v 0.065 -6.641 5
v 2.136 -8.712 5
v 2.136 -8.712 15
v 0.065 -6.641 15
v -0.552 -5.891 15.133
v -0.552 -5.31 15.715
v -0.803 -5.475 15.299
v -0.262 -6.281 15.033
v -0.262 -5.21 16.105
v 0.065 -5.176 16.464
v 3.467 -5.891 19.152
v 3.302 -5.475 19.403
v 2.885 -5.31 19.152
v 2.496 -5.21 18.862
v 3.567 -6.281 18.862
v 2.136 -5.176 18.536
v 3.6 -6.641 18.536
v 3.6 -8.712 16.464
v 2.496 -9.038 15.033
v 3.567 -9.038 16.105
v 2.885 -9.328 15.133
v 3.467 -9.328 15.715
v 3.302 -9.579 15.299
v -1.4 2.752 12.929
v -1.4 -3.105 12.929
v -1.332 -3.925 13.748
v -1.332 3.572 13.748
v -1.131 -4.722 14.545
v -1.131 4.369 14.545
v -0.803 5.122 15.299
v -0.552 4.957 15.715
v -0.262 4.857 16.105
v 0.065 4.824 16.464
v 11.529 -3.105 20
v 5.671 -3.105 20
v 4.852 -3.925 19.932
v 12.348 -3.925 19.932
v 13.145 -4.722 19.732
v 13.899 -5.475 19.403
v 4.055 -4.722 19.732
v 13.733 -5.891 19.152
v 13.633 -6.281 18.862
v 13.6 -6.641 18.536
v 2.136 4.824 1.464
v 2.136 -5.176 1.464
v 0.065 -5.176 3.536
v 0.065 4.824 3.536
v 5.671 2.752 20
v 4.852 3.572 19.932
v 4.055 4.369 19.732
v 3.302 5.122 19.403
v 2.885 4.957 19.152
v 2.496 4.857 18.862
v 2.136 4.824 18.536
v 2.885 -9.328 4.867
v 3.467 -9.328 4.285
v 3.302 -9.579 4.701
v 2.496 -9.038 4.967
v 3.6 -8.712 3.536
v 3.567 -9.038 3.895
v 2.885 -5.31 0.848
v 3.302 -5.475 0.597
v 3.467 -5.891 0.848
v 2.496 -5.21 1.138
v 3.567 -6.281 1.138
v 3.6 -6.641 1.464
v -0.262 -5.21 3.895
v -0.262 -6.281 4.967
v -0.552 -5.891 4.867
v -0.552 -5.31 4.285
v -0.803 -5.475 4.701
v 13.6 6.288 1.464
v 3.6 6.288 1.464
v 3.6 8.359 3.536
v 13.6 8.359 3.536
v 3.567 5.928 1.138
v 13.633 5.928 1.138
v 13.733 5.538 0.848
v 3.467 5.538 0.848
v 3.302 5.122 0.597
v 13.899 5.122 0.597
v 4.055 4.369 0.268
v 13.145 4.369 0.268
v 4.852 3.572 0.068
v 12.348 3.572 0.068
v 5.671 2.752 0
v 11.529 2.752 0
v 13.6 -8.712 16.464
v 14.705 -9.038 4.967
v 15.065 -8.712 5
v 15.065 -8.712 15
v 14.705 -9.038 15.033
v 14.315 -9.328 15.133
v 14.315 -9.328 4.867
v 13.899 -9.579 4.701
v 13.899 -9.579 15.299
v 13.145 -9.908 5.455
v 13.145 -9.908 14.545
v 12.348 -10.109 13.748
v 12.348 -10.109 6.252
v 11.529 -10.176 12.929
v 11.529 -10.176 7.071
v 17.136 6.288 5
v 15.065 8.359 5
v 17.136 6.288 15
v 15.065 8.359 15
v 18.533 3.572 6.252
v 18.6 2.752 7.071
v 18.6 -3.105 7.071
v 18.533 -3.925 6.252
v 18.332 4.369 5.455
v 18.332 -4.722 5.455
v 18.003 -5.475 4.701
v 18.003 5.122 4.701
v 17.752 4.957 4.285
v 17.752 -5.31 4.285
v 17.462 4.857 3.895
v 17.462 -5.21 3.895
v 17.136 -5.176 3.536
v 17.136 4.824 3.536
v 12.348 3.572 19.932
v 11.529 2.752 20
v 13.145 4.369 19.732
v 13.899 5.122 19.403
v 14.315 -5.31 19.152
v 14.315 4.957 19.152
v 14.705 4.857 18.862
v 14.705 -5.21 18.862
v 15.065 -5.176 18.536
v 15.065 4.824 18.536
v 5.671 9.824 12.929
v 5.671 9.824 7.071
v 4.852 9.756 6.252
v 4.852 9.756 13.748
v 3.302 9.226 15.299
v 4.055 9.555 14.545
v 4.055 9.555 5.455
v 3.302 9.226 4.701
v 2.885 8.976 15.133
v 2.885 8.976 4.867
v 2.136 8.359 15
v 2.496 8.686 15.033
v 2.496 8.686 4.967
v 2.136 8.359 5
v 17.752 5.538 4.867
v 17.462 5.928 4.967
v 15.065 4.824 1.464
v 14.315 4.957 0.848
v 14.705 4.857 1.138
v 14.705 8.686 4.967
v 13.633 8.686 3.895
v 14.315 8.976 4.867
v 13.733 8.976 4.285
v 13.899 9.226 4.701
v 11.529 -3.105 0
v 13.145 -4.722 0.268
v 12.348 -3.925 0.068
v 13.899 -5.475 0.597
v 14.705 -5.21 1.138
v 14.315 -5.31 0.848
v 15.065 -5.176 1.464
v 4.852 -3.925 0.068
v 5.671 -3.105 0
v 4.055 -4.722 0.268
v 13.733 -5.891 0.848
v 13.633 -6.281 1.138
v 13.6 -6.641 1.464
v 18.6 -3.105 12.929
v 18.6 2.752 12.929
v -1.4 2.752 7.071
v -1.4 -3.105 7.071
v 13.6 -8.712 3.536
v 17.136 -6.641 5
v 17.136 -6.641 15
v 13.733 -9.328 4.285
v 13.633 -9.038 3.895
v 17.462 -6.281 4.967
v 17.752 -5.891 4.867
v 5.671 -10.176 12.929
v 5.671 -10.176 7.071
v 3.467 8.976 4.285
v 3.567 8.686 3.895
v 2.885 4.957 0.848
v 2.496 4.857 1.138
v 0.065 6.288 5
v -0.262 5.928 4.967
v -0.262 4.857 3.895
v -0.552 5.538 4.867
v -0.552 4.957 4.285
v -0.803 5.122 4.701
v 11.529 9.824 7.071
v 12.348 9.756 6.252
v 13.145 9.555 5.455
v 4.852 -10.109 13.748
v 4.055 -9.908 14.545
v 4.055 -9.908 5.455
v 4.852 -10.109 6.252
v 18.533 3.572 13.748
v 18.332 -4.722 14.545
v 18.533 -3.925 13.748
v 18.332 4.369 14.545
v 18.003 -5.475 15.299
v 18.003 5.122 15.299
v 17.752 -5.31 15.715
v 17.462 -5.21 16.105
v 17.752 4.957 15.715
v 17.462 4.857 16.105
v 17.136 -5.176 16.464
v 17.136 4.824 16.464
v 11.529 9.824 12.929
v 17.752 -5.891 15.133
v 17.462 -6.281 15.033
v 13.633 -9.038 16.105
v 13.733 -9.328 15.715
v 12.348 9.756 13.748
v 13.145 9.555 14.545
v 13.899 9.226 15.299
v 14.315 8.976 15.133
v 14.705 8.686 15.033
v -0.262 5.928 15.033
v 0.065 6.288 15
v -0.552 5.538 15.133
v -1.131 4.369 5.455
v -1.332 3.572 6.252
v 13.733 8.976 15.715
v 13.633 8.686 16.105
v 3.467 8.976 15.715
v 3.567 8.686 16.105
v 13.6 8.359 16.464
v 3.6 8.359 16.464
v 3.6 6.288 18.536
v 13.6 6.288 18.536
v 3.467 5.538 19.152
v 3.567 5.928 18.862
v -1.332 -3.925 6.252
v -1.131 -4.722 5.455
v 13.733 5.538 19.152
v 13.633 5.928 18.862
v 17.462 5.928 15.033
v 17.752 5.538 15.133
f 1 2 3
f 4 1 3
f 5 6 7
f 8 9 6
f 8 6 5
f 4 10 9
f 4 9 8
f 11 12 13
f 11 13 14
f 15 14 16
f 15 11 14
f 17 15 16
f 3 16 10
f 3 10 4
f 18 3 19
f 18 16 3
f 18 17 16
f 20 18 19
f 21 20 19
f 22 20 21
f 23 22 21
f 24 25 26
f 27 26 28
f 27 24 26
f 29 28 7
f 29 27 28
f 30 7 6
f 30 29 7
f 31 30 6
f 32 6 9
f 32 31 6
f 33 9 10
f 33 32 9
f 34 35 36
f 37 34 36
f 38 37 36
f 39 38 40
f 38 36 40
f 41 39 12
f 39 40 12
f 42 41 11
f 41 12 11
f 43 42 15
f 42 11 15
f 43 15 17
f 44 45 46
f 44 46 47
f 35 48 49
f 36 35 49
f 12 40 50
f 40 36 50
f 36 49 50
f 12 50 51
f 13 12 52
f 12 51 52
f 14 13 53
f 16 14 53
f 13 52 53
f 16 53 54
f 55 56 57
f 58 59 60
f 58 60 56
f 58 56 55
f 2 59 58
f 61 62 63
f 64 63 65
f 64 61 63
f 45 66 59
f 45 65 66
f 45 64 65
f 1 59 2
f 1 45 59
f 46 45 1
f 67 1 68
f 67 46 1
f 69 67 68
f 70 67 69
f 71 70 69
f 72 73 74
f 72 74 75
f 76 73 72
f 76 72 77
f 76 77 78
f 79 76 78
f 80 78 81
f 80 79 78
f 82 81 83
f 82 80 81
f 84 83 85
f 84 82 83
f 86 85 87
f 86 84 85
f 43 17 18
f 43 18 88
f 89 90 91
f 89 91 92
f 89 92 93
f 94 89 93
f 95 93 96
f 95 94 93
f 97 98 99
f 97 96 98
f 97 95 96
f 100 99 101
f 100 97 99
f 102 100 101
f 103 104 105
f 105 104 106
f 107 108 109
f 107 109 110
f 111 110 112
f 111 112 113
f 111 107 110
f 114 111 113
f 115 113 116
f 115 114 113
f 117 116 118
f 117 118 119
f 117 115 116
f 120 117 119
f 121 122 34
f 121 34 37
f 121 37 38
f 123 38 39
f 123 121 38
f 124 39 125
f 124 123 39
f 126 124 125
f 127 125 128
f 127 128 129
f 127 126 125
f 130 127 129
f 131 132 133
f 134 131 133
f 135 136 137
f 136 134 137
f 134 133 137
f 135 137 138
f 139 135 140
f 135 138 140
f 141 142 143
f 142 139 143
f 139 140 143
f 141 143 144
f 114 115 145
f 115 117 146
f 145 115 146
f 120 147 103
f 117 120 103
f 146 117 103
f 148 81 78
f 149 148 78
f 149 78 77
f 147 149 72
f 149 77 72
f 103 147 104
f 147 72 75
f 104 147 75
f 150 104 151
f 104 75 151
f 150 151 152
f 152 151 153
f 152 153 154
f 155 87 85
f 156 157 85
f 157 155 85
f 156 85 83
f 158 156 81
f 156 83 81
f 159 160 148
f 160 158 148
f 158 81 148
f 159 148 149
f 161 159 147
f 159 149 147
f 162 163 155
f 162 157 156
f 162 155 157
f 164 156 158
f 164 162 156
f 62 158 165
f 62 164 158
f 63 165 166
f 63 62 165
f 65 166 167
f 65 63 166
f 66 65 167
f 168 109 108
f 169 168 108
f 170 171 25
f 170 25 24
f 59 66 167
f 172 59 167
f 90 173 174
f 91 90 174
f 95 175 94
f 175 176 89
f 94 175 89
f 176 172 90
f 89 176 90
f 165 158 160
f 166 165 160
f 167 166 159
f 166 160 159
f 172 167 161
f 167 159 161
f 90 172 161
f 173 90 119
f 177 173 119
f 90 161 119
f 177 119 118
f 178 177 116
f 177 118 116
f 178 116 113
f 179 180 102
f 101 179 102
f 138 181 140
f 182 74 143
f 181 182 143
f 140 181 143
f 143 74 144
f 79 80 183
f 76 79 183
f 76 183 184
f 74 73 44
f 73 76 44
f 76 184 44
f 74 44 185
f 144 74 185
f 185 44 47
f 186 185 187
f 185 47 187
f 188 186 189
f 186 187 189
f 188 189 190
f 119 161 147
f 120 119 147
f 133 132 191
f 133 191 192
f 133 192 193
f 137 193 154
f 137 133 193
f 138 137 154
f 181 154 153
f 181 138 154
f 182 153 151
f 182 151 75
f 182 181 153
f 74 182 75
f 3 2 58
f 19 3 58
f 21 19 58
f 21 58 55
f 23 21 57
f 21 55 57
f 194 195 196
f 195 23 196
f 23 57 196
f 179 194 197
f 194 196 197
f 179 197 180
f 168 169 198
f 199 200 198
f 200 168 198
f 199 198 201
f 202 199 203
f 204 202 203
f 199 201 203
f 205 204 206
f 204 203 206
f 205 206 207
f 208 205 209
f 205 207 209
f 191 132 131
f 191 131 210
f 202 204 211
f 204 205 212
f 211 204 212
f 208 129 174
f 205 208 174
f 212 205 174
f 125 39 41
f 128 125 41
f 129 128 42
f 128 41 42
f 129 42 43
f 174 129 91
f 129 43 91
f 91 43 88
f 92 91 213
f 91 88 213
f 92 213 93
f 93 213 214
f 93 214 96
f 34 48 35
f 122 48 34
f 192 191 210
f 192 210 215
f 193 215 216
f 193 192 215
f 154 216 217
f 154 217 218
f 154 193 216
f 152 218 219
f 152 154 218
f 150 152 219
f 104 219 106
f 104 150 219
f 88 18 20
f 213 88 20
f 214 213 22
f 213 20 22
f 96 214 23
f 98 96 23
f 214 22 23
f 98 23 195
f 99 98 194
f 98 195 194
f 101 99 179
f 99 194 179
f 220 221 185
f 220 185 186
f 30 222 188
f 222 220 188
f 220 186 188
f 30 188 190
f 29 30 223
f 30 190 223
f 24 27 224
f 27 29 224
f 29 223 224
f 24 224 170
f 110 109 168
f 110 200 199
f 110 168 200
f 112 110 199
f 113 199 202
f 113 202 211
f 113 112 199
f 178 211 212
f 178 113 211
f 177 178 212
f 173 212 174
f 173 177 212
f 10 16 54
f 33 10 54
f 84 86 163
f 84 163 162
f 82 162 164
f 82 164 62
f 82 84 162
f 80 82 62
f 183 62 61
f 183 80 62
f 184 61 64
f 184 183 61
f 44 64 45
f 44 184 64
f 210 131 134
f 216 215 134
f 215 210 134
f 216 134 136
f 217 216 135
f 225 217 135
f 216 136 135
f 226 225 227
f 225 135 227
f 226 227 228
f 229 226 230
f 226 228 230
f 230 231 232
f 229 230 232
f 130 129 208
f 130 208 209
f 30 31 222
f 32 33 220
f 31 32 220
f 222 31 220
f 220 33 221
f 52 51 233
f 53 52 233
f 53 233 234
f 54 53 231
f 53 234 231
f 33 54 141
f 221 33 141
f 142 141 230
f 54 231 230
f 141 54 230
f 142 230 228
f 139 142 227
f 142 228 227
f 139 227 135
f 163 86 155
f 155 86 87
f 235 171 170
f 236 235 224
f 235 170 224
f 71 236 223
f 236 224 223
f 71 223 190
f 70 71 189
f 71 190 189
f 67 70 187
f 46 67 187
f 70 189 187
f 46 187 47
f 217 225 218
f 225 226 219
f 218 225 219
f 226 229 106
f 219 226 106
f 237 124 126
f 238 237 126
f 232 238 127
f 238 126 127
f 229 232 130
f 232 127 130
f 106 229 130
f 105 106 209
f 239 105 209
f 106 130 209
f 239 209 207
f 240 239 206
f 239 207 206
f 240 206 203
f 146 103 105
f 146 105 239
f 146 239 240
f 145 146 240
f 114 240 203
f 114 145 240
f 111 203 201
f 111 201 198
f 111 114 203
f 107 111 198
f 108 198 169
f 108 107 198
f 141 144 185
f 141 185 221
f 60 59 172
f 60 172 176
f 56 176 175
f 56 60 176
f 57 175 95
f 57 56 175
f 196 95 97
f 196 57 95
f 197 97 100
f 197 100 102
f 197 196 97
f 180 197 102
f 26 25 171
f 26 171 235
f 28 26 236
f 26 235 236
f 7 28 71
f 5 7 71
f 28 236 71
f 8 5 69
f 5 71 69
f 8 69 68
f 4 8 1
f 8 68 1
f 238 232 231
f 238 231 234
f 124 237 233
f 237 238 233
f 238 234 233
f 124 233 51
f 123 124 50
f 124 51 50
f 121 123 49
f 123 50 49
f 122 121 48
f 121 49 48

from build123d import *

# Parameters (mm, degrees)
F0_W        = 20
F0_H        = 20
F1_DEPTH    = 20
F2_SIZE     = 5
F3_T1_DEPTH = 20.3553390593
F3_T3_DEPTH = 20.3553390593
F3_T5_DEPTH = 20.3553390593


# Not quite as in the source:
# - a fillet or chamfer that OpenCascade refuses, or shapes differently, is made with other operations: its cross-section is extruded or revolved along the edge and cut away or added


with BuildPart() as f1:
    # F0 (on Top) → F1 (new body)
    with BuildSketch(Plane.XY):
        with Locations((8.6001078598, -0.1764608825)):
            Rectangle(F0_W, F0_H)
    extrude(amount=F1_DEPTH)

    # F2
    f2_edges = [f1.edges().sort_by_distance(p)[0] for p in [
        (8.600108, -10.176461, 20),
        (18.600108, -0.176461, 20),
        (8.600108, 9.823539, 20),
        (-1.399892, -0.176461, 20),
        (-1.399892, -0.176461, 0),
        (8.600108, 9.823539, 0),
        (18.600108, -0.176461, 0),
        (8.600108, -10.176461, 0),
        (-1.399892, 9.823539, 10),
        (18.600108, 9.823539, 10),
        (18.600108, -10.176461, 10),
        (-1.399892, -10.176461, 10),
    ]]
    chamfer(f2_edges, length=F2_SIZE)

    # F3: fillet of radius 5 on 24 edges, made by hand

    # F3_s2 → F3_t1 (cut)
    with BuildSketch(Plane.XZ.offset(-10.0012086472)):
        with BuildLine():
            ThreePointArc((11.529040048, 0), (13.4424572098, 0.3806023374), (15.0645739539, 1.4644660941))
            Line((15.0645739539, 1.4644660941), (13.6001078598, 0))
            Line((13.6001078598, 0), (11.529040048, 0))
        make_face()
        with BuildLine():
            ThreePointArc((18.6001078598, 7.0710678119), (18.2195055224, 5.15765065), (17.1356417658, 3.5355339059))
            Line((17.1356417658, 3.5355339059), (18.6001078598, 5))
            Line((18.6001078598, 5), (18.6001078598, 7.0710678119))
        make_face()
        with BuildLine():
            ThreePointArc((18.6001078598, 12.9289321881), (18.2195055224, 14.84234935), (17.1356417658, 16.4644660941))
            Line((17.1356417658, 16.4644660941), (18.6001078598, 15))
            Line((18.6001078598, 15), (18.6001078598, 12.9289321881))
        make_face()
        with BuildLine():
            ThreePointArc((11.529040048, 20), (13.4424572098, 19.6193976626), (15.0645739539, 18.5355339059))
            Line((15.0645739539, 18.5355339059), (13.6001078598, 20))
            Line((13.6001078598, 20), (11.529040048, 20))
        make_face()
        with BuildLine():
            ThreePointArc((5.6711756717, 20), (3.7577585099, 19.6193976626), (2.1356417658, 18.5355339059))
            Line((2.1356417658, 18.5355339059), (3.6001078598, 20))
            Line((3.6001078598, 20), (5.6711756717, 20))
        make_face()
        with BuildLine():
            ThreePointArc((-1.3998921402, 12.9289321881), (-1.0192898027, 14.84234935), (0.0645739539, 16.4644660941))
            Line((0.0645739539, 16.4644660941), (-1.3998921402, 15))
            Line((-1.3998921402, 15), (-1.3998921402, 12.9289321881))
        make_face()
        with BuildLine():
            ThreePointArc((-1.3998921402, 7.0710678119), (-1.0192898027, 5.15765065), (0.0645739539, 3.5355339059))
            Line((0.0645739539, 3.5355339059), (-1.3998921402, 5))
            Line((-1.3998921402, 5), (-1.3998921402, 7.0710678119))
        make_face()
        with BuildLine():
            ThreePointArc((5.6711756717, 0), (3.7577585099, 0.3806023374), (2.1356417658, 1.4644660941))
            Line((2.1356417658, 1.4644660941), (3.6001078598, 0))
            Line((3.6001078598, 0), (5.6711756717, 0))
        make_face()
    extrude(amount=F3_T1_DEPTH, mode=Mode.SUBTRACT)

    # F3_s4 → F3_t3 (cut)
    with BuildSketch(Plane.YZ.offset(-1.5775616698)):
        with BuildLine():
            ThreePointArc((9.8235391175, 7.0710678119), (9.4429367801, 5.15765065), (8.3590730234, 3.5355339059))
            Line((8.3590730234, 3.5355339059), (9.8235391175, 5))
            Line((9.8235391175, 5), (9.8235391175, 7.0710678119))
        make_face()
        with BuildLine():
            ThreePointArc((9.8235391175, 12.9289321881), (9.4429367801, 14.84234935), (8.3590730234, 16.4644660941))
            Line((8.3590730234, 16.4644660941), (9.8235391175, 15))
            Line((9.8235391175, 15), (9.8235391175, 12.9289321881))
        make_face()
        with BuildLine():
            ThreePointArc((6.2880052116, 1.4644660941), (4.6658884675, 0.3806023374), (2.7524713056, 0))
            Line((2.7524713056, 0), (4.8235391175, 0))
            Line((4.8235391175, 0), (6.2880052116, 1.4644660941))
        make_face()
        with BuildLine():
            ThreePointArc((-3.1053930706, 0), (-5.0188102325, 0.3806023374), (-6.6409269766, 1.4644660941))
            Line((-6.6409269766, 1.4644660941), (-5.1764608825, 0))
            Line((-5.1764608825, 0), (-3.1053930706, 0))
        make_face()
        with BuildLine():
            ThreePointArc((-8.7119947884, 3.5355339059), (-9.795858545, 5.15765065), (-10.1764608825, 7.0710678119))
            Line((-10.1764608825, 7.0710678119), (-10.1764608825, 5))
            Line((-10.1764608825, 5), (-8.7119947884, 3.5355339059))
        make_face()
        with BuildLine():
            ThreePointArc((-8.7119947884, 16.4644660941), (-9.795858545, 14.84234935), (-10.1764608825, 12.9289321881))
            Line((-10.1764608825, 12.9289321881), (-10.1764608825, 15))
            Line((-10.1764608825, 15), (-8.7119947884, 16.4644660941))
        make_face()
        with BuildLine():
            ThreePointArc((-3.1053930706, 20), (-5.0188102325, 19.6193976626), (-6.6409269766, 18.5355339059))
            Line((-6.6409269766, 18.5355339059), (-5.1764608825, 20))
            Line((-5.1764608825, 20), (-3.1053930706, 20))
        make_face()
        with BuildLine():
            ThreePointArc((6.2880052116, 18.5355339059), (4.6658884675, 19.6193976626), (2.7524713056, 20))
            Line((2.7524713056, 20), (4.8235391175, 20))
            Line((4.8235391175, 20), (6.2880052116, 18.5355339059))
        make_face()
    extrude(amount=F3_T3_DEPTH, mode=Mode.SUBTRACT)

    # F3_s6 → F3_t5 (cut)
    with BuildSketch(Plane.XY.offset(-0.1776695297)):
        with BuildLine():
            ThreePointArc((0.0645739539, 6.2880052116), (-1.0192898027, 4.6658884675), (-1.3998921402, 2.7524713056))
            Line((-1.3998921402, 2.7524713056), (-1.3998921402, 4.8235391175))
            Line((-1.3998921402, 4.8235391175), (0.0645739539, 6.2880052116))
        make_face()
        with BuildLine():
            ThreePointArc((5.6711756717, 9.8235391175), (3.7577585099, 9.4429367801), (2.1356417658, 8.3590730234))
            Line((2.1356417658, 8.3590730234), (3.6001078598, 9.8235391175))
            Line((3.6001078598, 9.8235391175), (5.6711756717, 9.8235391175))
        make_face()
        with BuildLine():
            ThreePointArc((11.529040048, 9.8235391175), (13.4424572098, 9.4429367801), (15.0645739539, 8.3590730234))
            Line((15.0645739539, 8.3590730234), (13.6001078598, 9.8235391175))
            Line((13.6001078598, 9.8235391175), (11.529040048, 9.8235391175))
        make_face()
        with BuildLine():
            ThreePointArc((17.1356417658, 6.2880052116), (18.2195055224, 4.6658884675), (18.6001078598, 2.7524713056))
            Line((18.6001078598, 2.7524713056), (18.6001078598, 4.8235391175))
            Line((18.6001078598, 4.8235391175), (17.1356417658, 6.2880052116))
        make_face()
        with BuildLine():
            ThreePointArc((18.6001078598, -3.1053930706), (18.2195055224, -5.0188102325), (17.1356417658, -6.6409269766))
            Line((17.1356417658, -6.6409269766), (18.6001078598, -5.1764608825))
            Line((18.6001078598, -5.1764608825), (18.6001078598, -3.1053930706))
        make_face()
        with BuildLine():
            ThreePointArc((15.0645739539, -8.7119947884), (13.4424572098, -9.795858545), (11.529040048, -10.1764608825))
            Line((11.529040048, -10.1764608825), (13.6001078598, -10.1764608825))
            Line((13.6001078598, -10.1764608825), (15.0645739539, -8.7119947884))
        make_face()
        with BuildLine():
            ThreePointArc((2.1356417658, -8.7119947884), (3.7577585099, -9.795858545), (5.6711756717, -10.1764608825))
            Line((5.6711756717, -10.1764608825), (3.6001078598, -10.1764608825))
            Line((3.6001078598, -10.1764608825), (2.1356417658, -8.7119947884))
        make_face()
        with BuildLine():
            ThreePointArc((-1.3998921402, -3.1053930706), (-1.0192898027, -5.0188102325), (0.0645739539, -6.6409269766))
            Line((0.0645739539, -6.6409269766), (-1.3998921402, -5.1764608825))
            Line((-1.3998921402, -5.1764608825), (-1.3998921402, -3.1053930706))
        make_face()
    extrude(amount=F3_T5_DEPTH, mode=Mode.SUBTRACT)


solid = f1.part
